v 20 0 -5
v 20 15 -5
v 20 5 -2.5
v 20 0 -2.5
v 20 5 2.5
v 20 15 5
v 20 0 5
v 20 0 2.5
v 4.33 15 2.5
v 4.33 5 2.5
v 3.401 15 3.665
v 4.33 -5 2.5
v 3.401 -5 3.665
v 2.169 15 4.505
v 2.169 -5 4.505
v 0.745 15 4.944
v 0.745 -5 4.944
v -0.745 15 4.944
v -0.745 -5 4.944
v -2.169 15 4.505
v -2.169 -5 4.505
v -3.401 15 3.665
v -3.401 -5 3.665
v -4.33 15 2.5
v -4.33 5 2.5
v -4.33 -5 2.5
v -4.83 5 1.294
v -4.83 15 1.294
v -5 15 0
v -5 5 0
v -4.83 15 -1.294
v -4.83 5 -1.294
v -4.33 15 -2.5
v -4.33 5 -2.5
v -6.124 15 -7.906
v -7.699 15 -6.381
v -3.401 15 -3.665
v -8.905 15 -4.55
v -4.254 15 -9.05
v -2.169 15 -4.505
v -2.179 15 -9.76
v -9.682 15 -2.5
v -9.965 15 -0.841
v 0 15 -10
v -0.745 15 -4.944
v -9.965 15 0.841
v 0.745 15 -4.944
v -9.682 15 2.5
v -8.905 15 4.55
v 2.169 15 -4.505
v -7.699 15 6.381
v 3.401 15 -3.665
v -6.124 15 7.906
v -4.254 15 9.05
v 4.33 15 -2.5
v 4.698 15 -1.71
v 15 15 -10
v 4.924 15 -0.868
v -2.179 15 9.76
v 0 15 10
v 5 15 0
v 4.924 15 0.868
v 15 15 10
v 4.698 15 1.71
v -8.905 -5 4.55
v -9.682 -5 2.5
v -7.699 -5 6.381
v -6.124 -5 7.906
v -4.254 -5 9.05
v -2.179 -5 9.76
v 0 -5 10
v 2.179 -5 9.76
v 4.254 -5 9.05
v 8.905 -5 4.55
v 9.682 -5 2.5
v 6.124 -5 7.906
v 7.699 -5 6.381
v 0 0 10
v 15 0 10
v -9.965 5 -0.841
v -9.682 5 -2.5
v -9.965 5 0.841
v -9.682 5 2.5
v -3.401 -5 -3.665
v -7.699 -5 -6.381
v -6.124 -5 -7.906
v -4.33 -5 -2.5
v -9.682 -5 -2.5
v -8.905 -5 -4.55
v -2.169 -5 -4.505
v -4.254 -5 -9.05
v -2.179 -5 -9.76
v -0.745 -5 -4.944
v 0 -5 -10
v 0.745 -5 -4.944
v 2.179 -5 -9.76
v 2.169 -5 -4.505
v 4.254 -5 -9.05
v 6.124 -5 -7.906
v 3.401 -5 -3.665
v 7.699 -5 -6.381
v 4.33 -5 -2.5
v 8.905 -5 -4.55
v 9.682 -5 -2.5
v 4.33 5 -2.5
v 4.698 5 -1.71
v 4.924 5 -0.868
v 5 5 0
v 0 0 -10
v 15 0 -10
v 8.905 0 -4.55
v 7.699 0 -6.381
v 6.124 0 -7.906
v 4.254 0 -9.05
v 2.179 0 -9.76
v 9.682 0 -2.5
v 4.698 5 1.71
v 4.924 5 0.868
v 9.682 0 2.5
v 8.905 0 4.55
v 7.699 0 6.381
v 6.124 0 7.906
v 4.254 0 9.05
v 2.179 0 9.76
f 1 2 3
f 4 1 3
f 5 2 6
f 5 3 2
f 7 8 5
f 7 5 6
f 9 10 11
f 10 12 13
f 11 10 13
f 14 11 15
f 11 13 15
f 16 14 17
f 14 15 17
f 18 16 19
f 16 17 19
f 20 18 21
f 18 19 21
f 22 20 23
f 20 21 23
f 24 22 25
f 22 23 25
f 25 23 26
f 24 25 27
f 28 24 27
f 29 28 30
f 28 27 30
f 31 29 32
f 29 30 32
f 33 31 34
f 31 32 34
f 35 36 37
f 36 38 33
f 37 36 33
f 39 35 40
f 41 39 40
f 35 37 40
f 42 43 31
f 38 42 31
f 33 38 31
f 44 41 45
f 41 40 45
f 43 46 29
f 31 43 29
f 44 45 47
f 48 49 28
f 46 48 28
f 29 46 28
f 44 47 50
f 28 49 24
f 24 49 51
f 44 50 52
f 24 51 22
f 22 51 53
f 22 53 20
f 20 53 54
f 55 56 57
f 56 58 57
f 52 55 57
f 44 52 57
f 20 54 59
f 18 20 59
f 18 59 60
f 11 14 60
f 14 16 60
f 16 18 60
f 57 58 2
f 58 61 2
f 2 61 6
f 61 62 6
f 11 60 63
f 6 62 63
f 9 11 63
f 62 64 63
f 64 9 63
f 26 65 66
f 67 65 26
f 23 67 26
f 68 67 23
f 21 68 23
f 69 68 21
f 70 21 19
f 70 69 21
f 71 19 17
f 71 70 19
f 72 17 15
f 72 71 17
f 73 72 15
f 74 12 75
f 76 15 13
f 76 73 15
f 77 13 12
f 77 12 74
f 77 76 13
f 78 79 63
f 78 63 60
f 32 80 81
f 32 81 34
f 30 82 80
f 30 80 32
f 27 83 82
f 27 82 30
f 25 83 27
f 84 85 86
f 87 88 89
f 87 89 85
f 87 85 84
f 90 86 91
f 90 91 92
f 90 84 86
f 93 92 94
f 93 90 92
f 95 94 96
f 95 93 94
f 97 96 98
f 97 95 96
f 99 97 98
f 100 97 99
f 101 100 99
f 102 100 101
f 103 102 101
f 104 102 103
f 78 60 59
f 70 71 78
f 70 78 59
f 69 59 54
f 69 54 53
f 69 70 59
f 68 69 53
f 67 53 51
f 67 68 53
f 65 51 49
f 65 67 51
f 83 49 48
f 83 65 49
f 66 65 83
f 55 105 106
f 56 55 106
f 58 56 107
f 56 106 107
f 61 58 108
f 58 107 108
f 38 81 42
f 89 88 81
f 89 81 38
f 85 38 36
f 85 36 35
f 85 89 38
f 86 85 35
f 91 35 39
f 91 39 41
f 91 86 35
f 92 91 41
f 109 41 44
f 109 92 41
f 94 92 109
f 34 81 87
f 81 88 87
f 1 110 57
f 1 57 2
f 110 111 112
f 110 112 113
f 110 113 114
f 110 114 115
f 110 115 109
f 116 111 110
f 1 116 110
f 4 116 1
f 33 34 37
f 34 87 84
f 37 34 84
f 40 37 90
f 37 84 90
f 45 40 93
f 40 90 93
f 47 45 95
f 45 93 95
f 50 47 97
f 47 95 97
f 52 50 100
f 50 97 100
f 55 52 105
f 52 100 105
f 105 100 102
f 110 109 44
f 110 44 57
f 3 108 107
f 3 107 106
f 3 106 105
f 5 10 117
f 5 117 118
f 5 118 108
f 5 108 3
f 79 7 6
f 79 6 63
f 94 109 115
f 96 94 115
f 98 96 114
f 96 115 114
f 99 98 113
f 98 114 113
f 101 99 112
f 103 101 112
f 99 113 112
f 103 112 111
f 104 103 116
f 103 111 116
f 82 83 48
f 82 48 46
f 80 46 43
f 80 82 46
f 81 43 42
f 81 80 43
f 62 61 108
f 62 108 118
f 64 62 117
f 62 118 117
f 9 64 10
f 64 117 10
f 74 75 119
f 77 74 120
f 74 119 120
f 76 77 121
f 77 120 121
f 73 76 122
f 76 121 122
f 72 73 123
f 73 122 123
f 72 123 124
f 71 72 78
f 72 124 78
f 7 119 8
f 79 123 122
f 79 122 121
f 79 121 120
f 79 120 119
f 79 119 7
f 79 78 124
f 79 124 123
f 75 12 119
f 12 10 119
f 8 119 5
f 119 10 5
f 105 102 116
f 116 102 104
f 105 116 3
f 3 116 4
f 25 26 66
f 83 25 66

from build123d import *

# Parameters (mm, degrees)
F1_DEPTH      = 15
F2_DEPTH      = 5
F2_DEPTH_BACK = 15
F3_DEPTH      = 15.001
F4_DEPTH      = 5


with BuildPart() as f1:
    # F0 (on Front) → F1 (new body)
    with BuildSketch(Plane.XZ):
        with BuildLine():
            ThreePointArc((0, 10), (6.123724, 7.905694), (9.682458, 2.5))
            Line((9.682458, 2.5), (20, 2.5))
            Line((20, 2.5), (20, 5))
            Line((20, 5), (15, 10))
            Line((15, 10), (0, 10))
        make_face()
        with BuildLine():
            ThreePointArc((4.330127, 2.5), (4.829629, 1.294095), (5, 0))
            ThreePointArc((5, 0), (4.829629, -1.294095), (4.330127, -2.5))
            Line((4.330127, -2.5), (9.682458, -2.5))
            Line((9.682458, -2.5), (20, -2.5))
            Line((20, -2.5), (20, 2.5))
            Line((20, 2.5), (9.682458, 2.5))
            Line((9.682458, 2.5), (4.330127, 2.5))
        make_face()
        with BuildLine():
            Line((20, -2.5), (9.682458, -2.5))
            ThreePointArc((9.682458, -2.5), (6.123724, -7.905694), (0, -10))
            Line((0, -10), (15, -10))
            Line((15, -10), (20, -5))
            Line((20, -5), (20, -2.5))
        make_face()
        with BuildLine():
            ThreePointArc((4.330127, -2.5), (4.829629, -1.294095), (5, 0))
            ThreePointArc((5, 0), (4.829629, 1.294095), (4.330127, 2.5))
            ThreePointArc((4.330127, 2.5), (0, 5), (-4.330127, 2.5))
            ThreePointArc((-4.330127, 2.5), (-5, 0), (-4.330127, -2.5))
            ThreePointArc((-4.330127, -2.5), (0, -5), (4.330127, -2.5))
        make_face()
        with BuildLine():
            ThreePointArc((-4.330127, -2.5), (-5, 0), (-4.330127, 2.5))
            Line((-4.330127, 2.5), (-9.682458, 2.5))
            ThreePointArc((-9.682458, 2.5), (-10, 0), (-9.682458, -2.5))
            Line((-9.682458, -2.5), (-4.330127, -2.5))
        make_face()
    extrude(amount=-F1_DEPTH)

    # F0 (on Front) → F2 (join, two sides)
    with BuildSketch(Plane.XZ) as f2_sk:
        with BuildLine():
            ThreePointArc((-4.330127, 2.5), (0, 5), (4.330127, 2.5))
            Line((4.330127, 2.5), (9.682458, 2.5))
            ThreePointArc((9.682458, 2.5), (6.123724, 7.905694), (0, 10))
            ThreePointArc((0, 10), (-6.123724, 7.905694), (-9.682458, 2.5))
            Line((-9.682458, 2.5), (-4.330127, 2.5))
        make_face()
        with BuildLine():
            Line((9.682458, -2.5), (4.330127, -2.5))
            ThreePointArc((4.330127, -2.5), (0, -5), (-4.330127, -2.5))
            Line((-4.330127, -2.5), (-9.682458, -2.5))
            ThreePointArc((-9.682458, -2.5), (-6.123724, -7.905694), (0, -10))
            ThreePointArc((0, -10), (6.123724, -7.905694), (9.682458, -2.5))
        make_face()
    extrude(amount=F2_DEPTH)
    extrude(f2_sk.sketch, amount=-F2_DEPTH_BACK)

    # F0 (on Front) → F3 (cut, through all)
    with BuildSketch(Plane.XZ):
        with BuildLine():
            ThreePointArc((4.330127, -2.5), (4.829629, -1.294095), (5, 0))
            ThreePointArc((5, 0), (4.829629, 1.294095), (4.330127, 2.5))
            ThreePointArc((4.330127, 2.5), (0, 5), (-4.330127, 2.5))
            ThreePointArc((-4.330127, 2.5), (-5, 0), (-4.330127, -2.5))
            ThreePointArc((-4.330127, -2.5), (0, -5), (4.330127, -2.5))
        make_face()
    extrude(amount=-F3_DEPTH, mode=Mode.SUBTRACT)

    # F0 (on Front) → F4 (cut)
    with BuildSketch(Plane.XZ):
        with BuildLine():
            ThreePointArc((4.330127, 2.5), (4.829629, 1.294095), (5, 0))
            ThreePointArc((5, 0), (4.829629, -1.294095), (4.330127, -2.5))
            Line((4.330127, -2.5), (9.682458, -2.5))
            Line((9.682458, -2.5), (20, -2.5))
            Line((20, -2.5), (20, 2.5))
            Line((20, 2.5), (9.682458, 2.5))
            Line((9.682458, 2.5), (4.330127, 2.5))
        make_face()
        with BuildLine():
            ThreePointArc((-4.330127, -2.5), (-5, 0), (-4.330127, 2.5))
            Line((-4.330127, 2.5), (-9.682458, 2.5))
            ThreePointArc((-9.682458, 2.5), (-10, 0), (-9.682458, -2.5))
            Line((-9.682458, -2.5), (-4.330127, -2.5))
        make_face()
    extrude(amount=-F4_DEPTH, mode=Mode.SUBTRACT)


solid = f1.part
